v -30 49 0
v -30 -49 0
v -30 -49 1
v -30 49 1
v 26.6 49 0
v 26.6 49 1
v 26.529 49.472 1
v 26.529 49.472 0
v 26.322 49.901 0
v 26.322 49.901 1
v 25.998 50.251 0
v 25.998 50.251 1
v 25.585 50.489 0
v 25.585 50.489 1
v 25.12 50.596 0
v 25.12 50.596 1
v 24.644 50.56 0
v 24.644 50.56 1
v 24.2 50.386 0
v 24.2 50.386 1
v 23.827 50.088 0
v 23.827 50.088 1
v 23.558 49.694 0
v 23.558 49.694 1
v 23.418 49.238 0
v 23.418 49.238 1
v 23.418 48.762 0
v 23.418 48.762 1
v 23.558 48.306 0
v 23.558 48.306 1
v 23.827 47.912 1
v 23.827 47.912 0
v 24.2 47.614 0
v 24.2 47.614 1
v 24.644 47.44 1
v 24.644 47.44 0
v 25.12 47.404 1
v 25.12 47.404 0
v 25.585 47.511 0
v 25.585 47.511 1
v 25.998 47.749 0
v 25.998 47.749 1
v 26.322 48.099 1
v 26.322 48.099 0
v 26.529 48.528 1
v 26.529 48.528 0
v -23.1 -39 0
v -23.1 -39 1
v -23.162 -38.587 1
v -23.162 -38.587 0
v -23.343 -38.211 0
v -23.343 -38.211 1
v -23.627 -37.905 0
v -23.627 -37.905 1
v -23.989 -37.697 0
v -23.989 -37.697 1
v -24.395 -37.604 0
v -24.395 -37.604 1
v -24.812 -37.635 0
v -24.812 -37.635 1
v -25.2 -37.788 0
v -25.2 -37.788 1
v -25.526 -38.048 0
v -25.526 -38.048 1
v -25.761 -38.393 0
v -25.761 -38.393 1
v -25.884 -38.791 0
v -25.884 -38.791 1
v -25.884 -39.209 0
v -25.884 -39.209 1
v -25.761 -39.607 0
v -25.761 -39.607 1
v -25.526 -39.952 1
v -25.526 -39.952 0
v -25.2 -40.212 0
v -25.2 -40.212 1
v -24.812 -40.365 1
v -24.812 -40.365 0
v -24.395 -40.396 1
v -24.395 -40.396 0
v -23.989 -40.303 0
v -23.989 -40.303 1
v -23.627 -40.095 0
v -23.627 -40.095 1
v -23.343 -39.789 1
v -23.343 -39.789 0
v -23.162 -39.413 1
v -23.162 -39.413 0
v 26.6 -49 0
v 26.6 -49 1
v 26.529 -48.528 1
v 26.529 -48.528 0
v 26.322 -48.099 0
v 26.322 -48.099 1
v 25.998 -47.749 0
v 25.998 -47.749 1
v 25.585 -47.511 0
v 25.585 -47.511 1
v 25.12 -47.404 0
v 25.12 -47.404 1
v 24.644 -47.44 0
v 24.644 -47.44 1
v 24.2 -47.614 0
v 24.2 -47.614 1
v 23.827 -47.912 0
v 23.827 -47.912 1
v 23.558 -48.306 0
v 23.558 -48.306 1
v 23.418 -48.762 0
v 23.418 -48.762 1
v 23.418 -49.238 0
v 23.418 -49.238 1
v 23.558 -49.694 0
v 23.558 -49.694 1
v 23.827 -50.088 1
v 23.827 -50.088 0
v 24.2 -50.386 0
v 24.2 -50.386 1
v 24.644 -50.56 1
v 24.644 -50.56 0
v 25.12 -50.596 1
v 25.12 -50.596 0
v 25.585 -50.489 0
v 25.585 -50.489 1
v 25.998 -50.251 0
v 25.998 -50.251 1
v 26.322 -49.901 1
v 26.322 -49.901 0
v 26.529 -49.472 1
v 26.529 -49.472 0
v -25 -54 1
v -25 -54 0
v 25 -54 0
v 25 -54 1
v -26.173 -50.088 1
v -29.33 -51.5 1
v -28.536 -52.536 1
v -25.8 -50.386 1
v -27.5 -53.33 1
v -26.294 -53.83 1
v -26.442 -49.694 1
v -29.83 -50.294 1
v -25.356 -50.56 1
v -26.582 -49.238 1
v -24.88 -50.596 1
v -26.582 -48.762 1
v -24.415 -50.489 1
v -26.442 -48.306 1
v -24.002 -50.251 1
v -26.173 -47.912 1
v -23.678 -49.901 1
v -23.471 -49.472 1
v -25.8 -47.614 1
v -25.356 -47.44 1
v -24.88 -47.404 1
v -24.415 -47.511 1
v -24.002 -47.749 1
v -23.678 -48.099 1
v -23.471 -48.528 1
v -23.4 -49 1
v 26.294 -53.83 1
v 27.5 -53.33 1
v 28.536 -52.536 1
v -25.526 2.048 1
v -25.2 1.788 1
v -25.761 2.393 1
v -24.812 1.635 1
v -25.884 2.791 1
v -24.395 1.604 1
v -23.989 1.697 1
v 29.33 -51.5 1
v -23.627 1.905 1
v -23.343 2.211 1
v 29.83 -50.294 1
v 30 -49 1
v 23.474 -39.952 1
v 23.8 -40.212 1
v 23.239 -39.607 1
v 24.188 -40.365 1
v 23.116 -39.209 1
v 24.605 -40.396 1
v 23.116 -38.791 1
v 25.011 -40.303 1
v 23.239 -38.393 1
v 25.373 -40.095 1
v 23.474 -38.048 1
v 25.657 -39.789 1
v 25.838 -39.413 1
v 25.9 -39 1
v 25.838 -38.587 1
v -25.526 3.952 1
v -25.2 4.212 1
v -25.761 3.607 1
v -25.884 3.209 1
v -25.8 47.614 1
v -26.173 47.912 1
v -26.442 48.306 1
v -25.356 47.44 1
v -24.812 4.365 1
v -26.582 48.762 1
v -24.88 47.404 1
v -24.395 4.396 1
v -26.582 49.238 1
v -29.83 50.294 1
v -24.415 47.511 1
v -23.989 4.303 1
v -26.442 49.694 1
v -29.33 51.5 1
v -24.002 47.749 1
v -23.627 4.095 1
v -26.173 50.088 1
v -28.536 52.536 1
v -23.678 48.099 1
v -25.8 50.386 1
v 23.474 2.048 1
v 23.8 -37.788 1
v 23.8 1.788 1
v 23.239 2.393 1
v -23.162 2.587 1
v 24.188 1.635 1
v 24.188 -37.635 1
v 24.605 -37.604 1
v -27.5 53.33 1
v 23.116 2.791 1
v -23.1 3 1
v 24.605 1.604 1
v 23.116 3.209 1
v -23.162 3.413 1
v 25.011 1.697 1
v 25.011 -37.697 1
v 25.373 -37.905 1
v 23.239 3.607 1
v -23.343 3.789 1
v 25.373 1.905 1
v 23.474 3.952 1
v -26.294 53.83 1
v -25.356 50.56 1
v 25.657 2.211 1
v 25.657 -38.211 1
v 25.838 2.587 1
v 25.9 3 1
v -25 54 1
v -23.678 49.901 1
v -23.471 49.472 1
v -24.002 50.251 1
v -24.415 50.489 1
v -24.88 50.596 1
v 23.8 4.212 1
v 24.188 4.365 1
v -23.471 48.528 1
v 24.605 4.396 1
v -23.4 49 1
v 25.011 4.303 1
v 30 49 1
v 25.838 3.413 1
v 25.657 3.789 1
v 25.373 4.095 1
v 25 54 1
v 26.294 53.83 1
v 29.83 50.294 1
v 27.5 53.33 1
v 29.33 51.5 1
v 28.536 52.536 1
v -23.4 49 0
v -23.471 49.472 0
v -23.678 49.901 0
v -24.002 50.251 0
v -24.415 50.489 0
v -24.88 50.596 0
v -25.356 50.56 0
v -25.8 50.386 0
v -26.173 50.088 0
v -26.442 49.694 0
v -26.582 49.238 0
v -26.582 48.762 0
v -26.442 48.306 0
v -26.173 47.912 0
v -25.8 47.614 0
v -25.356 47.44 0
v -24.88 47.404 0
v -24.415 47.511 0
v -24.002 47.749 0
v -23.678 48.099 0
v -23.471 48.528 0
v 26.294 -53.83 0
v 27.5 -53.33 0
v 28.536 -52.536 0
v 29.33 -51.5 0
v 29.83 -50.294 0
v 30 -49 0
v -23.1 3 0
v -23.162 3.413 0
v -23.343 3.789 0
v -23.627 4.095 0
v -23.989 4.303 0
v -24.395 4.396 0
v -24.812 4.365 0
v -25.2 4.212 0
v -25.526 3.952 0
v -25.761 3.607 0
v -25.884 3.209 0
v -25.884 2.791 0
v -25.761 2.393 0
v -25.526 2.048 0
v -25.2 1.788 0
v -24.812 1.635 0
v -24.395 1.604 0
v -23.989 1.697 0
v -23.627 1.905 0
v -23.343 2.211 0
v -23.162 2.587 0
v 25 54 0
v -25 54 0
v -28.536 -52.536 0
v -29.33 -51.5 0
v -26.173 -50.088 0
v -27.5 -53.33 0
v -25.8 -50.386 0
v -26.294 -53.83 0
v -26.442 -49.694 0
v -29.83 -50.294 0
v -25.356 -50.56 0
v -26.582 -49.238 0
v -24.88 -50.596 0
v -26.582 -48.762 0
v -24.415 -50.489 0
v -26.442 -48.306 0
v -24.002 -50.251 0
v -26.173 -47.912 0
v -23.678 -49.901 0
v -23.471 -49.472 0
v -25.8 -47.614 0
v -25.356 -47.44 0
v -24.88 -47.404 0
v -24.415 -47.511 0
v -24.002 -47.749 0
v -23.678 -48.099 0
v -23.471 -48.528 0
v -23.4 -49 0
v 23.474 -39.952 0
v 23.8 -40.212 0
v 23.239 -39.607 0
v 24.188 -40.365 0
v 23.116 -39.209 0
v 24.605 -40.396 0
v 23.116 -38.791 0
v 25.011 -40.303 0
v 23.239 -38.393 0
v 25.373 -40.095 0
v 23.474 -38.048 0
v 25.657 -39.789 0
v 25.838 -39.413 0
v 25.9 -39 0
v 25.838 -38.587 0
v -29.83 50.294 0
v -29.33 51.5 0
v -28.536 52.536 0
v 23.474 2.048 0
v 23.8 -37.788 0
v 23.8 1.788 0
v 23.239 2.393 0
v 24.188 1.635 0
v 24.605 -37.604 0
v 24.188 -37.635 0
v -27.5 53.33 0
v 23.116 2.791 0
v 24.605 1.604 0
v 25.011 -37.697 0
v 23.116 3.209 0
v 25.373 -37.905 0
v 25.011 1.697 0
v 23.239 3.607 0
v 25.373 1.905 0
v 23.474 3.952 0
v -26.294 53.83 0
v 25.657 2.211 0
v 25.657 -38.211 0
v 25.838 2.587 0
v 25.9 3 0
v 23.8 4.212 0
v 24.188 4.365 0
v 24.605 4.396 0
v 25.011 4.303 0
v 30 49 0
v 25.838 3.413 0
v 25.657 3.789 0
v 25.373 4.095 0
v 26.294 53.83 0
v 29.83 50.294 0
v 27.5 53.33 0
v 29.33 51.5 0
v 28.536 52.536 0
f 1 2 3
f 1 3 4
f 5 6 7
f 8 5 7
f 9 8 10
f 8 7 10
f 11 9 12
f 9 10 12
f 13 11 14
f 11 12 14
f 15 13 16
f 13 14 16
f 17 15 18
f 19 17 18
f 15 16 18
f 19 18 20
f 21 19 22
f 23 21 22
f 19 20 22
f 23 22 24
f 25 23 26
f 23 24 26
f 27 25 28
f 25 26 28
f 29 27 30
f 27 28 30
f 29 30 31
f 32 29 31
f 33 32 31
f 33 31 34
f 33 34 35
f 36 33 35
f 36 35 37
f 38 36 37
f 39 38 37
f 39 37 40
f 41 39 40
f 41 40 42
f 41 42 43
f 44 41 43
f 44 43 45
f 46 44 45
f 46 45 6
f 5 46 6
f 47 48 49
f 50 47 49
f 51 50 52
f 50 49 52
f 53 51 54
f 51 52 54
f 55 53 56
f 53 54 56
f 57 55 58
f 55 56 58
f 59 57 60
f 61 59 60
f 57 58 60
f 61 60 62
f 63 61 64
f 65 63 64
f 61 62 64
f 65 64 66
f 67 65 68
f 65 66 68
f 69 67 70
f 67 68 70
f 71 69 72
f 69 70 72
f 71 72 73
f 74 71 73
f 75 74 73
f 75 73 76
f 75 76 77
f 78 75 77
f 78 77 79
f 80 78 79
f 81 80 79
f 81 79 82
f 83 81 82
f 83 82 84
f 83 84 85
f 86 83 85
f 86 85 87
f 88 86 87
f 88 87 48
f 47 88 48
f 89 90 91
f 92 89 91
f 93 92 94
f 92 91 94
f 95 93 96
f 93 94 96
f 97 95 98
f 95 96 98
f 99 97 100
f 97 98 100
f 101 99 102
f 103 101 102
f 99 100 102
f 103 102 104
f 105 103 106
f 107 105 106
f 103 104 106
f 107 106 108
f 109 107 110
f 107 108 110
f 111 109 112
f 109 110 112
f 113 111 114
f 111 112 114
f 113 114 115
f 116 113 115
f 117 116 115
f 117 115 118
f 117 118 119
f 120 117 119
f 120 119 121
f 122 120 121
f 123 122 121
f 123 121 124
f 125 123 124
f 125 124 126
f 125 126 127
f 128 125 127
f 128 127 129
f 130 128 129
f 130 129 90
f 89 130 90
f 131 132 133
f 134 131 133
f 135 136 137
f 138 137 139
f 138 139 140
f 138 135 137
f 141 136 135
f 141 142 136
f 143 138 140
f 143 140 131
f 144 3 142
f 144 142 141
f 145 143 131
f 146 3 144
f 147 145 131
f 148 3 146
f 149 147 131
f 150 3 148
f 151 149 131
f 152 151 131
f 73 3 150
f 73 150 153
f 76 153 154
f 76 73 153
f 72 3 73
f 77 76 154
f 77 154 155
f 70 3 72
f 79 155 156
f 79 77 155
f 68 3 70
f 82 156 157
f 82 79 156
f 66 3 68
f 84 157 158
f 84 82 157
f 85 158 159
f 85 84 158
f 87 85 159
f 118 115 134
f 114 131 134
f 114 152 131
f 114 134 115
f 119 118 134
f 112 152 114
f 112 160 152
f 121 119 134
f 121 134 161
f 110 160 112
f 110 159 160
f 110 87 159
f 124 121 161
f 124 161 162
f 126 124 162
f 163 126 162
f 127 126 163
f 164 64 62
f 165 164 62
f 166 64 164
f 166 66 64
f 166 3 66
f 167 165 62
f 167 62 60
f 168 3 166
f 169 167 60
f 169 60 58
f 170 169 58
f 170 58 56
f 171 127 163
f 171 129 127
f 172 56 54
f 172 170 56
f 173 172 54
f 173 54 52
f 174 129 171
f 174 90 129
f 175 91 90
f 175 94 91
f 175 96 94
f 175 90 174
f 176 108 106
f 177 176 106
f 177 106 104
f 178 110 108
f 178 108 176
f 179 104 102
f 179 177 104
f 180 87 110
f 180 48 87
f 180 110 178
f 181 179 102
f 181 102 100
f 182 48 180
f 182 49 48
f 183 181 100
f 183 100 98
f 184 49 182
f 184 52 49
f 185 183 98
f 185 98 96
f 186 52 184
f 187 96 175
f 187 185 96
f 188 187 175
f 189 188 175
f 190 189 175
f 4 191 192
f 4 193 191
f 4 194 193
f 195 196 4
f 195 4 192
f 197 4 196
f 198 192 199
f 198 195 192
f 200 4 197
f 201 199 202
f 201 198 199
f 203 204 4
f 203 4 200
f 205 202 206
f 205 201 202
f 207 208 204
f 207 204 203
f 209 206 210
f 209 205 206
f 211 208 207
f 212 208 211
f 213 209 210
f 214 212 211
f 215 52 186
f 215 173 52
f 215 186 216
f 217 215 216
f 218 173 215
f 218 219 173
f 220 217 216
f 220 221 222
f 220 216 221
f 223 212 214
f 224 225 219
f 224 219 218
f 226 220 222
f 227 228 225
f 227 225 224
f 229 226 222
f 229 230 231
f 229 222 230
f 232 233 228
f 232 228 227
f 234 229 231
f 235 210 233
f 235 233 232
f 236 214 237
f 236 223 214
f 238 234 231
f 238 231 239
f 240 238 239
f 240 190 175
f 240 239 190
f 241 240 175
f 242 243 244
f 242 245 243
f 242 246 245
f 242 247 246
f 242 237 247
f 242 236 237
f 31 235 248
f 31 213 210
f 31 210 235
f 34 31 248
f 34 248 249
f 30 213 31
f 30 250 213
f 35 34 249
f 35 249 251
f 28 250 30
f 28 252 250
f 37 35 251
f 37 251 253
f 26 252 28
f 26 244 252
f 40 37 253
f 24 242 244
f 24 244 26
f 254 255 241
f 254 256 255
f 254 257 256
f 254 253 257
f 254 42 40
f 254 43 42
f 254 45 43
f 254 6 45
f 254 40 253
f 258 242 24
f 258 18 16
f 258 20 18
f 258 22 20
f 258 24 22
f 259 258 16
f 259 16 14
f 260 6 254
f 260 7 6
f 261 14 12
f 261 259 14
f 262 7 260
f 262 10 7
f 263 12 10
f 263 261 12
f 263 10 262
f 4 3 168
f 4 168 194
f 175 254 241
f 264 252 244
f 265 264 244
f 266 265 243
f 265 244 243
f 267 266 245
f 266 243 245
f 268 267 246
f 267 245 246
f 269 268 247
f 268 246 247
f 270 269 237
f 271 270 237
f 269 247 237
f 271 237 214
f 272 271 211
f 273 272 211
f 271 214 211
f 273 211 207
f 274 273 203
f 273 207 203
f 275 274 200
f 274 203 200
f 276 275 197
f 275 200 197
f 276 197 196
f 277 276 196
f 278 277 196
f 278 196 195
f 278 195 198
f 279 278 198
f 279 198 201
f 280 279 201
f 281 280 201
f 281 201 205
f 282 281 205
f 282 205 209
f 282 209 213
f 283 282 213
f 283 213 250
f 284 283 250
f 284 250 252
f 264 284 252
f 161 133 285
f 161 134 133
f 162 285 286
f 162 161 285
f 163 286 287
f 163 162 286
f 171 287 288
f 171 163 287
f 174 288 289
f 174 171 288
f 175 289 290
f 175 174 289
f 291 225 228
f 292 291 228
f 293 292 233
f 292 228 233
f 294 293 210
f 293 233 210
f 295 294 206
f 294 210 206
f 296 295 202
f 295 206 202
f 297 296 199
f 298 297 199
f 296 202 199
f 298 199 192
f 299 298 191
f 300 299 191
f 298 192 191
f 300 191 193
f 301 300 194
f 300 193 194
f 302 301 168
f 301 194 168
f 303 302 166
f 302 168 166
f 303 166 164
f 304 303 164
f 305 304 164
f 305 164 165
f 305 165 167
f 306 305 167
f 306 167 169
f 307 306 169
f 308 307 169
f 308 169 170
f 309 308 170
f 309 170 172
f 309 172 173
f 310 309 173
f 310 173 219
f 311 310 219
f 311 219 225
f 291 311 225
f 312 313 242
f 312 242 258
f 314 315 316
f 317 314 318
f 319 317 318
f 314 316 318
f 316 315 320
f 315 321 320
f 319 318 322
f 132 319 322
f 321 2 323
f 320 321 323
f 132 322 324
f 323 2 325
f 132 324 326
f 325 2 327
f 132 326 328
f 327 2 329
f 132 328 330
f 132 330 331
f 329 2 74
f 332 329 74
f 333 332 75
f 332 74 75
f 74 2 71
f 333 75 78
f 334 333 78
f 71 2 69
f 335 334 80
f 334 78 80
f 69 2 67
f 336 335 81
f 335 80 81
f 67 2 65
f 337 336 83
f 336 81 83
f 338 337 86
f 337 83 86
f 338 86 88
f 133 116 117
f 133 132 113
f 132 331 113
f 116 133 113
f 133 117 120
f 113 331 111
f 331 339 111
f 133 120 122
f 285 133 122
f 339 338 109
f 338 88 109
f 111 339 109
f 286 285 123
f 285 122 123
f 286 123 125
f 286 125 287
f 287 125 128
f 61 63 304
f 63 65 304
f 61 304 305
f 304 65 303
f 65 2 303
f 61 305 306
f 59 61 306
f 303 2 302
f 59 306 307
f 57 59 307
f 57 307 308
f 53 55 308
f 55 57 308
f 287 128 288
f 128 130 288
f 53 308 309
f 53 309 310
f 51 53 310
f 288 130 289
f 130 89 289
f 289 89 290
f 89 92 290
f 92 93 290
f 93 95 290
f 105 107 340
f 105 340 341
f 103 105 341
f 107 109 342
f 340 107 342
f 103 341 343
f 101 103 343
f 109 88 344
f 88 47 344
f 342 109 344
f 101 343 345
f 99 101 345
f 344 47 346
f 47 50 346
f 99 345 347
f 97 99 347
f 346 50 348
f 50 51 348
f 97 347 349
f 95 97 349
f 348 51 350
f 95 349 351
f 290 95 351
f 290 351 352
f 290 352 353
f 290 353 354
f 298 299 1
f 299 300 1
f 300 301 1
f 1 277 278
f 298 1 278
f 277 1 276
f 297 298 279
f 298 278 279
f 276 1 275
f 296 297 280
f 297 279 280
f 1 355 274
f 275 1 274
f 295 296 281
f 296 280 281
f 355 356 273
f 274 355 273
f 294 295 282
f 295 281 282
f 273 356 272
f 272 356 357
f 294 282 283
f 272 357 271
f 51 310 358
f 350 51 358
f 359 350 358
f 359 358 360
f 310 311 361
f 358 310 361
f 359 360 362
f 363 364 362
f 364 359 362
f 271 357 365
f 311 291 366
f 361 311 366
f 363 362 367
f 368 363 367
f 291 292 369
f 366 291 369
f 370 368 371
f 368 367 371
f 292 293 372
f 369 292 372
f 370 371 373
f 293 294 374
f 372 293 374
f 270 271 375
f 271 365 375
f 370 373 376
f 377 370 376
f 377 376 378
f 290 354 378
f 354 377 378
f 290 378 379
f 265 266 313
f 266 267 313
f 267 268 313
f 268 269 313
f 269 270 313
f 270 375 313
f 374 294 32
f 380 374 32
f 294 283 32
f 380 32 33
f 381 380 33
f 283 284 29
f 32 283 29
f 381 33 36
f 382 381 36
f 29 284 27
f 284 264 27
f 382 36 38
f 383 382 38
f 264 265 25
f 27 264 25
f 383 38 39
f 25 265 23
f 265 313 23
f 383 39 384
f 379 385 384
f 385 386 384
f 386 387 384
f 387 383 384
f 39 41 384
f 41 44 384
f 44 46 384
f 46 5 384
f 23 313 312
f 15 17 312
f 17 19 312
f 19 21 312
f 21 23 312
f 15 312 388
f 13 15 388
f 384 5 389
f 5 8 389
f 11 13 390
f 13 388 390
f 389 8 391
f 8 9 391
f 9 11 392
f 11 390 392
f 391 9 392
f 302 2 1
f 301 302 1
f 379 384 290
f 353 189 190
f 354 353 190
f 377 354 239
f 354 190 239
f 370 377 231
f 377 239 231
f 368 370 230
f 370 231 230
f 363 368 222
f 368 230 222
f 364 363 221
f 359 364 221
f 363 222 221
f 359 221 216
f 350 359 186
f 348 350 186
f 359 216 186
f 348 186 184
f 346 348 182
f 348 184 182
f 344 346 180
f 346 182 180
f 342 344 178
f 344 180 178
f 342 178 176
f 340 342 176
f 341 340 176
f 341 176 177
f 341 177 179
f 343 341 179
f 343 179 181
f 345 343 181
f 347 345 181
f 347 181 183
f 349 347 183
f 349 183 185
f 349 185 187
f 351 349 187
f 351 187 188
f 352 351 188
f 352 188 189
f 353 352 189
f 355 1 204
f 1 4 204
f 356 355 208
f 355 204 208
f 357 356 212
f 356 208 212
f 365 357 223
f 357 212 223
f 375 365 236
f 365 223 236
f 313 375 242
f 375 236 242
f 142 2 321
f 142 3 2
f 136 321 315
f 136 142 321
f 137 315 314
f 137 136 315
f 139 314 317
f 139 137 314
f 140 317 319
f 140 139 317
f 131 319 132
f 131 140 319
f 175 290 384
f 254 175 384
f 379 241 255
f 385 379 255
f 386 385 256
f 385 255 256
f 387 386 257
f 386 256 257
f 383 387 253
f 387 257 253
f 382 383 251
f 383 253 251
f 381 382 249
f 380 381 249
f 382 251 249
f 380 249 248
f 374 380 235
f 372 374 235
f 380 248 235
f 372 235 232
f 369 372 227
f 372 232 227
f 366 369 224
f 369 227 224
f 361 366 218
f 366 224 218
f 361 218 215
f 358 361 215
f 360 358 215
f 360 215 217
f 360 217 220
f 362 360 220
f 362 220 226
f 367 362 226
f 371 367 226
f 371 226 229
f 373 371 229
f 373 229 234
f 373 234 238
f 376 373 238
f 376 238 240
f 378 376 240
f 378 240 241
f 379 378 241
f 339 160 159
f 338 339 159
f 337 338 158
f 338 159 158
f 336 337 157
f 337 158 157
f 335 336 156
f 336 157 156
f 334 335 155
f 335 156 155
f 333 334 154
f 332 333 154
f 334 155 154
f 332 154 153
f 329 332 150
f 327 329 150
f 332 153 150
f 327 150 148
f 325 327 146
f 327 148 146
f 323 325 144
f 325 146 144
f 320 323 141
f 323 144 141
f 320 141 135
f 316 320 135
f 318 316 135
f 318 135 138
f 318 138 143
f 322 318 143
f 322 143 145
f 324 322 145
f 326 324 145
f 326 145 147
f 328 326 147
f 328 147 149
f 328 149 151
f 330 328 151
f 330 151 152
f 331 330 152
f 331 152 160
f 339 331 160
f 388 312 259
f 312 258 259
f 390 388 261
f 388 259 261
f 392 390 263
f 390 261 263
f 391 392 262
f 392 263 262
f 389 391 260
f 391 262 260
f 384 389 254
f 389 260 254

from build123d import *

# Parameters (mm, degrees)
SKETCH_1_W          = 60
SKETCH_1_H          = 108
EXTRUDE_1_DEPTH     = 1
SKETCH_4_R          = 1.4
CUT_EXTRUDE_2_DEPTH = 10
SKETCH_9_R          = 1.6
CUT_EXTRUDE_5_DEPTH = 62.781874365
FILLET_1_R          = 5


with BuildPart() as part:
    # ｽｹｯﾁ1 → ﾎﾞｽ - 押し出し1 (new body)
    with BuildSketch(Plane.XY):
        Rectangle(SKETCH_1_W, SKETCH_1_H)
    extrude(amount=EXTRUDE_1_DEPTH)

    # ｽｹｯﾁ4 → ｶｯﾄ - 押し出し2 (cut)
    with BuildSketch(Plane.XY.offset(1)):
        with Locations((-24.5, 3)):
            Circle(SKETCH_4_R)
        with Locations((-24.5, -39)):
            Circle(SKETCH_4_R)
        with Locations((24.5, 3)):
            Circle(SKETCH_4_R)
        with Locations((24.5, -39)):
            Circle(SKETCH_4_R)
    extrude(amount=-CUT_EXTRUDE_2_DEPTH, mode=Mode.SUBTRACT)

    # ｽｹｯﾁ9 → ｶｯﾄ - 押し出し5 (cut, through all)
    with BuildSketch(Plane.XY.offset(1)):
        with Locations((25, 49)):
            Circle(SKETCH_9_R)
        with Locations((-25, 49)):
            Circle(SKETCH_9_R)
        with Locations((-25, -49)):
            Circle(SKETCH_9_R)
        with Locations((25, -49)):
            Circle(SKETCH_9_R)
    extrude(amount=-CUT_EXTRUDE_5_DEPTH, mode=Mode.SUBTRACT)

    # ﾌｨﾚｯﾄ1
    fillet_1_edges = [part.edges().sort_by_distance(p)[0] for p in [
        (30, -54, 0.5),
        (-30, -54, 0.5),
        (-30, 54, 0.5),
        (30, 54, 0.5),
    ]]
    fillet(fillet_1_edges, radius=FILLET_1_R)


solid = part.part
